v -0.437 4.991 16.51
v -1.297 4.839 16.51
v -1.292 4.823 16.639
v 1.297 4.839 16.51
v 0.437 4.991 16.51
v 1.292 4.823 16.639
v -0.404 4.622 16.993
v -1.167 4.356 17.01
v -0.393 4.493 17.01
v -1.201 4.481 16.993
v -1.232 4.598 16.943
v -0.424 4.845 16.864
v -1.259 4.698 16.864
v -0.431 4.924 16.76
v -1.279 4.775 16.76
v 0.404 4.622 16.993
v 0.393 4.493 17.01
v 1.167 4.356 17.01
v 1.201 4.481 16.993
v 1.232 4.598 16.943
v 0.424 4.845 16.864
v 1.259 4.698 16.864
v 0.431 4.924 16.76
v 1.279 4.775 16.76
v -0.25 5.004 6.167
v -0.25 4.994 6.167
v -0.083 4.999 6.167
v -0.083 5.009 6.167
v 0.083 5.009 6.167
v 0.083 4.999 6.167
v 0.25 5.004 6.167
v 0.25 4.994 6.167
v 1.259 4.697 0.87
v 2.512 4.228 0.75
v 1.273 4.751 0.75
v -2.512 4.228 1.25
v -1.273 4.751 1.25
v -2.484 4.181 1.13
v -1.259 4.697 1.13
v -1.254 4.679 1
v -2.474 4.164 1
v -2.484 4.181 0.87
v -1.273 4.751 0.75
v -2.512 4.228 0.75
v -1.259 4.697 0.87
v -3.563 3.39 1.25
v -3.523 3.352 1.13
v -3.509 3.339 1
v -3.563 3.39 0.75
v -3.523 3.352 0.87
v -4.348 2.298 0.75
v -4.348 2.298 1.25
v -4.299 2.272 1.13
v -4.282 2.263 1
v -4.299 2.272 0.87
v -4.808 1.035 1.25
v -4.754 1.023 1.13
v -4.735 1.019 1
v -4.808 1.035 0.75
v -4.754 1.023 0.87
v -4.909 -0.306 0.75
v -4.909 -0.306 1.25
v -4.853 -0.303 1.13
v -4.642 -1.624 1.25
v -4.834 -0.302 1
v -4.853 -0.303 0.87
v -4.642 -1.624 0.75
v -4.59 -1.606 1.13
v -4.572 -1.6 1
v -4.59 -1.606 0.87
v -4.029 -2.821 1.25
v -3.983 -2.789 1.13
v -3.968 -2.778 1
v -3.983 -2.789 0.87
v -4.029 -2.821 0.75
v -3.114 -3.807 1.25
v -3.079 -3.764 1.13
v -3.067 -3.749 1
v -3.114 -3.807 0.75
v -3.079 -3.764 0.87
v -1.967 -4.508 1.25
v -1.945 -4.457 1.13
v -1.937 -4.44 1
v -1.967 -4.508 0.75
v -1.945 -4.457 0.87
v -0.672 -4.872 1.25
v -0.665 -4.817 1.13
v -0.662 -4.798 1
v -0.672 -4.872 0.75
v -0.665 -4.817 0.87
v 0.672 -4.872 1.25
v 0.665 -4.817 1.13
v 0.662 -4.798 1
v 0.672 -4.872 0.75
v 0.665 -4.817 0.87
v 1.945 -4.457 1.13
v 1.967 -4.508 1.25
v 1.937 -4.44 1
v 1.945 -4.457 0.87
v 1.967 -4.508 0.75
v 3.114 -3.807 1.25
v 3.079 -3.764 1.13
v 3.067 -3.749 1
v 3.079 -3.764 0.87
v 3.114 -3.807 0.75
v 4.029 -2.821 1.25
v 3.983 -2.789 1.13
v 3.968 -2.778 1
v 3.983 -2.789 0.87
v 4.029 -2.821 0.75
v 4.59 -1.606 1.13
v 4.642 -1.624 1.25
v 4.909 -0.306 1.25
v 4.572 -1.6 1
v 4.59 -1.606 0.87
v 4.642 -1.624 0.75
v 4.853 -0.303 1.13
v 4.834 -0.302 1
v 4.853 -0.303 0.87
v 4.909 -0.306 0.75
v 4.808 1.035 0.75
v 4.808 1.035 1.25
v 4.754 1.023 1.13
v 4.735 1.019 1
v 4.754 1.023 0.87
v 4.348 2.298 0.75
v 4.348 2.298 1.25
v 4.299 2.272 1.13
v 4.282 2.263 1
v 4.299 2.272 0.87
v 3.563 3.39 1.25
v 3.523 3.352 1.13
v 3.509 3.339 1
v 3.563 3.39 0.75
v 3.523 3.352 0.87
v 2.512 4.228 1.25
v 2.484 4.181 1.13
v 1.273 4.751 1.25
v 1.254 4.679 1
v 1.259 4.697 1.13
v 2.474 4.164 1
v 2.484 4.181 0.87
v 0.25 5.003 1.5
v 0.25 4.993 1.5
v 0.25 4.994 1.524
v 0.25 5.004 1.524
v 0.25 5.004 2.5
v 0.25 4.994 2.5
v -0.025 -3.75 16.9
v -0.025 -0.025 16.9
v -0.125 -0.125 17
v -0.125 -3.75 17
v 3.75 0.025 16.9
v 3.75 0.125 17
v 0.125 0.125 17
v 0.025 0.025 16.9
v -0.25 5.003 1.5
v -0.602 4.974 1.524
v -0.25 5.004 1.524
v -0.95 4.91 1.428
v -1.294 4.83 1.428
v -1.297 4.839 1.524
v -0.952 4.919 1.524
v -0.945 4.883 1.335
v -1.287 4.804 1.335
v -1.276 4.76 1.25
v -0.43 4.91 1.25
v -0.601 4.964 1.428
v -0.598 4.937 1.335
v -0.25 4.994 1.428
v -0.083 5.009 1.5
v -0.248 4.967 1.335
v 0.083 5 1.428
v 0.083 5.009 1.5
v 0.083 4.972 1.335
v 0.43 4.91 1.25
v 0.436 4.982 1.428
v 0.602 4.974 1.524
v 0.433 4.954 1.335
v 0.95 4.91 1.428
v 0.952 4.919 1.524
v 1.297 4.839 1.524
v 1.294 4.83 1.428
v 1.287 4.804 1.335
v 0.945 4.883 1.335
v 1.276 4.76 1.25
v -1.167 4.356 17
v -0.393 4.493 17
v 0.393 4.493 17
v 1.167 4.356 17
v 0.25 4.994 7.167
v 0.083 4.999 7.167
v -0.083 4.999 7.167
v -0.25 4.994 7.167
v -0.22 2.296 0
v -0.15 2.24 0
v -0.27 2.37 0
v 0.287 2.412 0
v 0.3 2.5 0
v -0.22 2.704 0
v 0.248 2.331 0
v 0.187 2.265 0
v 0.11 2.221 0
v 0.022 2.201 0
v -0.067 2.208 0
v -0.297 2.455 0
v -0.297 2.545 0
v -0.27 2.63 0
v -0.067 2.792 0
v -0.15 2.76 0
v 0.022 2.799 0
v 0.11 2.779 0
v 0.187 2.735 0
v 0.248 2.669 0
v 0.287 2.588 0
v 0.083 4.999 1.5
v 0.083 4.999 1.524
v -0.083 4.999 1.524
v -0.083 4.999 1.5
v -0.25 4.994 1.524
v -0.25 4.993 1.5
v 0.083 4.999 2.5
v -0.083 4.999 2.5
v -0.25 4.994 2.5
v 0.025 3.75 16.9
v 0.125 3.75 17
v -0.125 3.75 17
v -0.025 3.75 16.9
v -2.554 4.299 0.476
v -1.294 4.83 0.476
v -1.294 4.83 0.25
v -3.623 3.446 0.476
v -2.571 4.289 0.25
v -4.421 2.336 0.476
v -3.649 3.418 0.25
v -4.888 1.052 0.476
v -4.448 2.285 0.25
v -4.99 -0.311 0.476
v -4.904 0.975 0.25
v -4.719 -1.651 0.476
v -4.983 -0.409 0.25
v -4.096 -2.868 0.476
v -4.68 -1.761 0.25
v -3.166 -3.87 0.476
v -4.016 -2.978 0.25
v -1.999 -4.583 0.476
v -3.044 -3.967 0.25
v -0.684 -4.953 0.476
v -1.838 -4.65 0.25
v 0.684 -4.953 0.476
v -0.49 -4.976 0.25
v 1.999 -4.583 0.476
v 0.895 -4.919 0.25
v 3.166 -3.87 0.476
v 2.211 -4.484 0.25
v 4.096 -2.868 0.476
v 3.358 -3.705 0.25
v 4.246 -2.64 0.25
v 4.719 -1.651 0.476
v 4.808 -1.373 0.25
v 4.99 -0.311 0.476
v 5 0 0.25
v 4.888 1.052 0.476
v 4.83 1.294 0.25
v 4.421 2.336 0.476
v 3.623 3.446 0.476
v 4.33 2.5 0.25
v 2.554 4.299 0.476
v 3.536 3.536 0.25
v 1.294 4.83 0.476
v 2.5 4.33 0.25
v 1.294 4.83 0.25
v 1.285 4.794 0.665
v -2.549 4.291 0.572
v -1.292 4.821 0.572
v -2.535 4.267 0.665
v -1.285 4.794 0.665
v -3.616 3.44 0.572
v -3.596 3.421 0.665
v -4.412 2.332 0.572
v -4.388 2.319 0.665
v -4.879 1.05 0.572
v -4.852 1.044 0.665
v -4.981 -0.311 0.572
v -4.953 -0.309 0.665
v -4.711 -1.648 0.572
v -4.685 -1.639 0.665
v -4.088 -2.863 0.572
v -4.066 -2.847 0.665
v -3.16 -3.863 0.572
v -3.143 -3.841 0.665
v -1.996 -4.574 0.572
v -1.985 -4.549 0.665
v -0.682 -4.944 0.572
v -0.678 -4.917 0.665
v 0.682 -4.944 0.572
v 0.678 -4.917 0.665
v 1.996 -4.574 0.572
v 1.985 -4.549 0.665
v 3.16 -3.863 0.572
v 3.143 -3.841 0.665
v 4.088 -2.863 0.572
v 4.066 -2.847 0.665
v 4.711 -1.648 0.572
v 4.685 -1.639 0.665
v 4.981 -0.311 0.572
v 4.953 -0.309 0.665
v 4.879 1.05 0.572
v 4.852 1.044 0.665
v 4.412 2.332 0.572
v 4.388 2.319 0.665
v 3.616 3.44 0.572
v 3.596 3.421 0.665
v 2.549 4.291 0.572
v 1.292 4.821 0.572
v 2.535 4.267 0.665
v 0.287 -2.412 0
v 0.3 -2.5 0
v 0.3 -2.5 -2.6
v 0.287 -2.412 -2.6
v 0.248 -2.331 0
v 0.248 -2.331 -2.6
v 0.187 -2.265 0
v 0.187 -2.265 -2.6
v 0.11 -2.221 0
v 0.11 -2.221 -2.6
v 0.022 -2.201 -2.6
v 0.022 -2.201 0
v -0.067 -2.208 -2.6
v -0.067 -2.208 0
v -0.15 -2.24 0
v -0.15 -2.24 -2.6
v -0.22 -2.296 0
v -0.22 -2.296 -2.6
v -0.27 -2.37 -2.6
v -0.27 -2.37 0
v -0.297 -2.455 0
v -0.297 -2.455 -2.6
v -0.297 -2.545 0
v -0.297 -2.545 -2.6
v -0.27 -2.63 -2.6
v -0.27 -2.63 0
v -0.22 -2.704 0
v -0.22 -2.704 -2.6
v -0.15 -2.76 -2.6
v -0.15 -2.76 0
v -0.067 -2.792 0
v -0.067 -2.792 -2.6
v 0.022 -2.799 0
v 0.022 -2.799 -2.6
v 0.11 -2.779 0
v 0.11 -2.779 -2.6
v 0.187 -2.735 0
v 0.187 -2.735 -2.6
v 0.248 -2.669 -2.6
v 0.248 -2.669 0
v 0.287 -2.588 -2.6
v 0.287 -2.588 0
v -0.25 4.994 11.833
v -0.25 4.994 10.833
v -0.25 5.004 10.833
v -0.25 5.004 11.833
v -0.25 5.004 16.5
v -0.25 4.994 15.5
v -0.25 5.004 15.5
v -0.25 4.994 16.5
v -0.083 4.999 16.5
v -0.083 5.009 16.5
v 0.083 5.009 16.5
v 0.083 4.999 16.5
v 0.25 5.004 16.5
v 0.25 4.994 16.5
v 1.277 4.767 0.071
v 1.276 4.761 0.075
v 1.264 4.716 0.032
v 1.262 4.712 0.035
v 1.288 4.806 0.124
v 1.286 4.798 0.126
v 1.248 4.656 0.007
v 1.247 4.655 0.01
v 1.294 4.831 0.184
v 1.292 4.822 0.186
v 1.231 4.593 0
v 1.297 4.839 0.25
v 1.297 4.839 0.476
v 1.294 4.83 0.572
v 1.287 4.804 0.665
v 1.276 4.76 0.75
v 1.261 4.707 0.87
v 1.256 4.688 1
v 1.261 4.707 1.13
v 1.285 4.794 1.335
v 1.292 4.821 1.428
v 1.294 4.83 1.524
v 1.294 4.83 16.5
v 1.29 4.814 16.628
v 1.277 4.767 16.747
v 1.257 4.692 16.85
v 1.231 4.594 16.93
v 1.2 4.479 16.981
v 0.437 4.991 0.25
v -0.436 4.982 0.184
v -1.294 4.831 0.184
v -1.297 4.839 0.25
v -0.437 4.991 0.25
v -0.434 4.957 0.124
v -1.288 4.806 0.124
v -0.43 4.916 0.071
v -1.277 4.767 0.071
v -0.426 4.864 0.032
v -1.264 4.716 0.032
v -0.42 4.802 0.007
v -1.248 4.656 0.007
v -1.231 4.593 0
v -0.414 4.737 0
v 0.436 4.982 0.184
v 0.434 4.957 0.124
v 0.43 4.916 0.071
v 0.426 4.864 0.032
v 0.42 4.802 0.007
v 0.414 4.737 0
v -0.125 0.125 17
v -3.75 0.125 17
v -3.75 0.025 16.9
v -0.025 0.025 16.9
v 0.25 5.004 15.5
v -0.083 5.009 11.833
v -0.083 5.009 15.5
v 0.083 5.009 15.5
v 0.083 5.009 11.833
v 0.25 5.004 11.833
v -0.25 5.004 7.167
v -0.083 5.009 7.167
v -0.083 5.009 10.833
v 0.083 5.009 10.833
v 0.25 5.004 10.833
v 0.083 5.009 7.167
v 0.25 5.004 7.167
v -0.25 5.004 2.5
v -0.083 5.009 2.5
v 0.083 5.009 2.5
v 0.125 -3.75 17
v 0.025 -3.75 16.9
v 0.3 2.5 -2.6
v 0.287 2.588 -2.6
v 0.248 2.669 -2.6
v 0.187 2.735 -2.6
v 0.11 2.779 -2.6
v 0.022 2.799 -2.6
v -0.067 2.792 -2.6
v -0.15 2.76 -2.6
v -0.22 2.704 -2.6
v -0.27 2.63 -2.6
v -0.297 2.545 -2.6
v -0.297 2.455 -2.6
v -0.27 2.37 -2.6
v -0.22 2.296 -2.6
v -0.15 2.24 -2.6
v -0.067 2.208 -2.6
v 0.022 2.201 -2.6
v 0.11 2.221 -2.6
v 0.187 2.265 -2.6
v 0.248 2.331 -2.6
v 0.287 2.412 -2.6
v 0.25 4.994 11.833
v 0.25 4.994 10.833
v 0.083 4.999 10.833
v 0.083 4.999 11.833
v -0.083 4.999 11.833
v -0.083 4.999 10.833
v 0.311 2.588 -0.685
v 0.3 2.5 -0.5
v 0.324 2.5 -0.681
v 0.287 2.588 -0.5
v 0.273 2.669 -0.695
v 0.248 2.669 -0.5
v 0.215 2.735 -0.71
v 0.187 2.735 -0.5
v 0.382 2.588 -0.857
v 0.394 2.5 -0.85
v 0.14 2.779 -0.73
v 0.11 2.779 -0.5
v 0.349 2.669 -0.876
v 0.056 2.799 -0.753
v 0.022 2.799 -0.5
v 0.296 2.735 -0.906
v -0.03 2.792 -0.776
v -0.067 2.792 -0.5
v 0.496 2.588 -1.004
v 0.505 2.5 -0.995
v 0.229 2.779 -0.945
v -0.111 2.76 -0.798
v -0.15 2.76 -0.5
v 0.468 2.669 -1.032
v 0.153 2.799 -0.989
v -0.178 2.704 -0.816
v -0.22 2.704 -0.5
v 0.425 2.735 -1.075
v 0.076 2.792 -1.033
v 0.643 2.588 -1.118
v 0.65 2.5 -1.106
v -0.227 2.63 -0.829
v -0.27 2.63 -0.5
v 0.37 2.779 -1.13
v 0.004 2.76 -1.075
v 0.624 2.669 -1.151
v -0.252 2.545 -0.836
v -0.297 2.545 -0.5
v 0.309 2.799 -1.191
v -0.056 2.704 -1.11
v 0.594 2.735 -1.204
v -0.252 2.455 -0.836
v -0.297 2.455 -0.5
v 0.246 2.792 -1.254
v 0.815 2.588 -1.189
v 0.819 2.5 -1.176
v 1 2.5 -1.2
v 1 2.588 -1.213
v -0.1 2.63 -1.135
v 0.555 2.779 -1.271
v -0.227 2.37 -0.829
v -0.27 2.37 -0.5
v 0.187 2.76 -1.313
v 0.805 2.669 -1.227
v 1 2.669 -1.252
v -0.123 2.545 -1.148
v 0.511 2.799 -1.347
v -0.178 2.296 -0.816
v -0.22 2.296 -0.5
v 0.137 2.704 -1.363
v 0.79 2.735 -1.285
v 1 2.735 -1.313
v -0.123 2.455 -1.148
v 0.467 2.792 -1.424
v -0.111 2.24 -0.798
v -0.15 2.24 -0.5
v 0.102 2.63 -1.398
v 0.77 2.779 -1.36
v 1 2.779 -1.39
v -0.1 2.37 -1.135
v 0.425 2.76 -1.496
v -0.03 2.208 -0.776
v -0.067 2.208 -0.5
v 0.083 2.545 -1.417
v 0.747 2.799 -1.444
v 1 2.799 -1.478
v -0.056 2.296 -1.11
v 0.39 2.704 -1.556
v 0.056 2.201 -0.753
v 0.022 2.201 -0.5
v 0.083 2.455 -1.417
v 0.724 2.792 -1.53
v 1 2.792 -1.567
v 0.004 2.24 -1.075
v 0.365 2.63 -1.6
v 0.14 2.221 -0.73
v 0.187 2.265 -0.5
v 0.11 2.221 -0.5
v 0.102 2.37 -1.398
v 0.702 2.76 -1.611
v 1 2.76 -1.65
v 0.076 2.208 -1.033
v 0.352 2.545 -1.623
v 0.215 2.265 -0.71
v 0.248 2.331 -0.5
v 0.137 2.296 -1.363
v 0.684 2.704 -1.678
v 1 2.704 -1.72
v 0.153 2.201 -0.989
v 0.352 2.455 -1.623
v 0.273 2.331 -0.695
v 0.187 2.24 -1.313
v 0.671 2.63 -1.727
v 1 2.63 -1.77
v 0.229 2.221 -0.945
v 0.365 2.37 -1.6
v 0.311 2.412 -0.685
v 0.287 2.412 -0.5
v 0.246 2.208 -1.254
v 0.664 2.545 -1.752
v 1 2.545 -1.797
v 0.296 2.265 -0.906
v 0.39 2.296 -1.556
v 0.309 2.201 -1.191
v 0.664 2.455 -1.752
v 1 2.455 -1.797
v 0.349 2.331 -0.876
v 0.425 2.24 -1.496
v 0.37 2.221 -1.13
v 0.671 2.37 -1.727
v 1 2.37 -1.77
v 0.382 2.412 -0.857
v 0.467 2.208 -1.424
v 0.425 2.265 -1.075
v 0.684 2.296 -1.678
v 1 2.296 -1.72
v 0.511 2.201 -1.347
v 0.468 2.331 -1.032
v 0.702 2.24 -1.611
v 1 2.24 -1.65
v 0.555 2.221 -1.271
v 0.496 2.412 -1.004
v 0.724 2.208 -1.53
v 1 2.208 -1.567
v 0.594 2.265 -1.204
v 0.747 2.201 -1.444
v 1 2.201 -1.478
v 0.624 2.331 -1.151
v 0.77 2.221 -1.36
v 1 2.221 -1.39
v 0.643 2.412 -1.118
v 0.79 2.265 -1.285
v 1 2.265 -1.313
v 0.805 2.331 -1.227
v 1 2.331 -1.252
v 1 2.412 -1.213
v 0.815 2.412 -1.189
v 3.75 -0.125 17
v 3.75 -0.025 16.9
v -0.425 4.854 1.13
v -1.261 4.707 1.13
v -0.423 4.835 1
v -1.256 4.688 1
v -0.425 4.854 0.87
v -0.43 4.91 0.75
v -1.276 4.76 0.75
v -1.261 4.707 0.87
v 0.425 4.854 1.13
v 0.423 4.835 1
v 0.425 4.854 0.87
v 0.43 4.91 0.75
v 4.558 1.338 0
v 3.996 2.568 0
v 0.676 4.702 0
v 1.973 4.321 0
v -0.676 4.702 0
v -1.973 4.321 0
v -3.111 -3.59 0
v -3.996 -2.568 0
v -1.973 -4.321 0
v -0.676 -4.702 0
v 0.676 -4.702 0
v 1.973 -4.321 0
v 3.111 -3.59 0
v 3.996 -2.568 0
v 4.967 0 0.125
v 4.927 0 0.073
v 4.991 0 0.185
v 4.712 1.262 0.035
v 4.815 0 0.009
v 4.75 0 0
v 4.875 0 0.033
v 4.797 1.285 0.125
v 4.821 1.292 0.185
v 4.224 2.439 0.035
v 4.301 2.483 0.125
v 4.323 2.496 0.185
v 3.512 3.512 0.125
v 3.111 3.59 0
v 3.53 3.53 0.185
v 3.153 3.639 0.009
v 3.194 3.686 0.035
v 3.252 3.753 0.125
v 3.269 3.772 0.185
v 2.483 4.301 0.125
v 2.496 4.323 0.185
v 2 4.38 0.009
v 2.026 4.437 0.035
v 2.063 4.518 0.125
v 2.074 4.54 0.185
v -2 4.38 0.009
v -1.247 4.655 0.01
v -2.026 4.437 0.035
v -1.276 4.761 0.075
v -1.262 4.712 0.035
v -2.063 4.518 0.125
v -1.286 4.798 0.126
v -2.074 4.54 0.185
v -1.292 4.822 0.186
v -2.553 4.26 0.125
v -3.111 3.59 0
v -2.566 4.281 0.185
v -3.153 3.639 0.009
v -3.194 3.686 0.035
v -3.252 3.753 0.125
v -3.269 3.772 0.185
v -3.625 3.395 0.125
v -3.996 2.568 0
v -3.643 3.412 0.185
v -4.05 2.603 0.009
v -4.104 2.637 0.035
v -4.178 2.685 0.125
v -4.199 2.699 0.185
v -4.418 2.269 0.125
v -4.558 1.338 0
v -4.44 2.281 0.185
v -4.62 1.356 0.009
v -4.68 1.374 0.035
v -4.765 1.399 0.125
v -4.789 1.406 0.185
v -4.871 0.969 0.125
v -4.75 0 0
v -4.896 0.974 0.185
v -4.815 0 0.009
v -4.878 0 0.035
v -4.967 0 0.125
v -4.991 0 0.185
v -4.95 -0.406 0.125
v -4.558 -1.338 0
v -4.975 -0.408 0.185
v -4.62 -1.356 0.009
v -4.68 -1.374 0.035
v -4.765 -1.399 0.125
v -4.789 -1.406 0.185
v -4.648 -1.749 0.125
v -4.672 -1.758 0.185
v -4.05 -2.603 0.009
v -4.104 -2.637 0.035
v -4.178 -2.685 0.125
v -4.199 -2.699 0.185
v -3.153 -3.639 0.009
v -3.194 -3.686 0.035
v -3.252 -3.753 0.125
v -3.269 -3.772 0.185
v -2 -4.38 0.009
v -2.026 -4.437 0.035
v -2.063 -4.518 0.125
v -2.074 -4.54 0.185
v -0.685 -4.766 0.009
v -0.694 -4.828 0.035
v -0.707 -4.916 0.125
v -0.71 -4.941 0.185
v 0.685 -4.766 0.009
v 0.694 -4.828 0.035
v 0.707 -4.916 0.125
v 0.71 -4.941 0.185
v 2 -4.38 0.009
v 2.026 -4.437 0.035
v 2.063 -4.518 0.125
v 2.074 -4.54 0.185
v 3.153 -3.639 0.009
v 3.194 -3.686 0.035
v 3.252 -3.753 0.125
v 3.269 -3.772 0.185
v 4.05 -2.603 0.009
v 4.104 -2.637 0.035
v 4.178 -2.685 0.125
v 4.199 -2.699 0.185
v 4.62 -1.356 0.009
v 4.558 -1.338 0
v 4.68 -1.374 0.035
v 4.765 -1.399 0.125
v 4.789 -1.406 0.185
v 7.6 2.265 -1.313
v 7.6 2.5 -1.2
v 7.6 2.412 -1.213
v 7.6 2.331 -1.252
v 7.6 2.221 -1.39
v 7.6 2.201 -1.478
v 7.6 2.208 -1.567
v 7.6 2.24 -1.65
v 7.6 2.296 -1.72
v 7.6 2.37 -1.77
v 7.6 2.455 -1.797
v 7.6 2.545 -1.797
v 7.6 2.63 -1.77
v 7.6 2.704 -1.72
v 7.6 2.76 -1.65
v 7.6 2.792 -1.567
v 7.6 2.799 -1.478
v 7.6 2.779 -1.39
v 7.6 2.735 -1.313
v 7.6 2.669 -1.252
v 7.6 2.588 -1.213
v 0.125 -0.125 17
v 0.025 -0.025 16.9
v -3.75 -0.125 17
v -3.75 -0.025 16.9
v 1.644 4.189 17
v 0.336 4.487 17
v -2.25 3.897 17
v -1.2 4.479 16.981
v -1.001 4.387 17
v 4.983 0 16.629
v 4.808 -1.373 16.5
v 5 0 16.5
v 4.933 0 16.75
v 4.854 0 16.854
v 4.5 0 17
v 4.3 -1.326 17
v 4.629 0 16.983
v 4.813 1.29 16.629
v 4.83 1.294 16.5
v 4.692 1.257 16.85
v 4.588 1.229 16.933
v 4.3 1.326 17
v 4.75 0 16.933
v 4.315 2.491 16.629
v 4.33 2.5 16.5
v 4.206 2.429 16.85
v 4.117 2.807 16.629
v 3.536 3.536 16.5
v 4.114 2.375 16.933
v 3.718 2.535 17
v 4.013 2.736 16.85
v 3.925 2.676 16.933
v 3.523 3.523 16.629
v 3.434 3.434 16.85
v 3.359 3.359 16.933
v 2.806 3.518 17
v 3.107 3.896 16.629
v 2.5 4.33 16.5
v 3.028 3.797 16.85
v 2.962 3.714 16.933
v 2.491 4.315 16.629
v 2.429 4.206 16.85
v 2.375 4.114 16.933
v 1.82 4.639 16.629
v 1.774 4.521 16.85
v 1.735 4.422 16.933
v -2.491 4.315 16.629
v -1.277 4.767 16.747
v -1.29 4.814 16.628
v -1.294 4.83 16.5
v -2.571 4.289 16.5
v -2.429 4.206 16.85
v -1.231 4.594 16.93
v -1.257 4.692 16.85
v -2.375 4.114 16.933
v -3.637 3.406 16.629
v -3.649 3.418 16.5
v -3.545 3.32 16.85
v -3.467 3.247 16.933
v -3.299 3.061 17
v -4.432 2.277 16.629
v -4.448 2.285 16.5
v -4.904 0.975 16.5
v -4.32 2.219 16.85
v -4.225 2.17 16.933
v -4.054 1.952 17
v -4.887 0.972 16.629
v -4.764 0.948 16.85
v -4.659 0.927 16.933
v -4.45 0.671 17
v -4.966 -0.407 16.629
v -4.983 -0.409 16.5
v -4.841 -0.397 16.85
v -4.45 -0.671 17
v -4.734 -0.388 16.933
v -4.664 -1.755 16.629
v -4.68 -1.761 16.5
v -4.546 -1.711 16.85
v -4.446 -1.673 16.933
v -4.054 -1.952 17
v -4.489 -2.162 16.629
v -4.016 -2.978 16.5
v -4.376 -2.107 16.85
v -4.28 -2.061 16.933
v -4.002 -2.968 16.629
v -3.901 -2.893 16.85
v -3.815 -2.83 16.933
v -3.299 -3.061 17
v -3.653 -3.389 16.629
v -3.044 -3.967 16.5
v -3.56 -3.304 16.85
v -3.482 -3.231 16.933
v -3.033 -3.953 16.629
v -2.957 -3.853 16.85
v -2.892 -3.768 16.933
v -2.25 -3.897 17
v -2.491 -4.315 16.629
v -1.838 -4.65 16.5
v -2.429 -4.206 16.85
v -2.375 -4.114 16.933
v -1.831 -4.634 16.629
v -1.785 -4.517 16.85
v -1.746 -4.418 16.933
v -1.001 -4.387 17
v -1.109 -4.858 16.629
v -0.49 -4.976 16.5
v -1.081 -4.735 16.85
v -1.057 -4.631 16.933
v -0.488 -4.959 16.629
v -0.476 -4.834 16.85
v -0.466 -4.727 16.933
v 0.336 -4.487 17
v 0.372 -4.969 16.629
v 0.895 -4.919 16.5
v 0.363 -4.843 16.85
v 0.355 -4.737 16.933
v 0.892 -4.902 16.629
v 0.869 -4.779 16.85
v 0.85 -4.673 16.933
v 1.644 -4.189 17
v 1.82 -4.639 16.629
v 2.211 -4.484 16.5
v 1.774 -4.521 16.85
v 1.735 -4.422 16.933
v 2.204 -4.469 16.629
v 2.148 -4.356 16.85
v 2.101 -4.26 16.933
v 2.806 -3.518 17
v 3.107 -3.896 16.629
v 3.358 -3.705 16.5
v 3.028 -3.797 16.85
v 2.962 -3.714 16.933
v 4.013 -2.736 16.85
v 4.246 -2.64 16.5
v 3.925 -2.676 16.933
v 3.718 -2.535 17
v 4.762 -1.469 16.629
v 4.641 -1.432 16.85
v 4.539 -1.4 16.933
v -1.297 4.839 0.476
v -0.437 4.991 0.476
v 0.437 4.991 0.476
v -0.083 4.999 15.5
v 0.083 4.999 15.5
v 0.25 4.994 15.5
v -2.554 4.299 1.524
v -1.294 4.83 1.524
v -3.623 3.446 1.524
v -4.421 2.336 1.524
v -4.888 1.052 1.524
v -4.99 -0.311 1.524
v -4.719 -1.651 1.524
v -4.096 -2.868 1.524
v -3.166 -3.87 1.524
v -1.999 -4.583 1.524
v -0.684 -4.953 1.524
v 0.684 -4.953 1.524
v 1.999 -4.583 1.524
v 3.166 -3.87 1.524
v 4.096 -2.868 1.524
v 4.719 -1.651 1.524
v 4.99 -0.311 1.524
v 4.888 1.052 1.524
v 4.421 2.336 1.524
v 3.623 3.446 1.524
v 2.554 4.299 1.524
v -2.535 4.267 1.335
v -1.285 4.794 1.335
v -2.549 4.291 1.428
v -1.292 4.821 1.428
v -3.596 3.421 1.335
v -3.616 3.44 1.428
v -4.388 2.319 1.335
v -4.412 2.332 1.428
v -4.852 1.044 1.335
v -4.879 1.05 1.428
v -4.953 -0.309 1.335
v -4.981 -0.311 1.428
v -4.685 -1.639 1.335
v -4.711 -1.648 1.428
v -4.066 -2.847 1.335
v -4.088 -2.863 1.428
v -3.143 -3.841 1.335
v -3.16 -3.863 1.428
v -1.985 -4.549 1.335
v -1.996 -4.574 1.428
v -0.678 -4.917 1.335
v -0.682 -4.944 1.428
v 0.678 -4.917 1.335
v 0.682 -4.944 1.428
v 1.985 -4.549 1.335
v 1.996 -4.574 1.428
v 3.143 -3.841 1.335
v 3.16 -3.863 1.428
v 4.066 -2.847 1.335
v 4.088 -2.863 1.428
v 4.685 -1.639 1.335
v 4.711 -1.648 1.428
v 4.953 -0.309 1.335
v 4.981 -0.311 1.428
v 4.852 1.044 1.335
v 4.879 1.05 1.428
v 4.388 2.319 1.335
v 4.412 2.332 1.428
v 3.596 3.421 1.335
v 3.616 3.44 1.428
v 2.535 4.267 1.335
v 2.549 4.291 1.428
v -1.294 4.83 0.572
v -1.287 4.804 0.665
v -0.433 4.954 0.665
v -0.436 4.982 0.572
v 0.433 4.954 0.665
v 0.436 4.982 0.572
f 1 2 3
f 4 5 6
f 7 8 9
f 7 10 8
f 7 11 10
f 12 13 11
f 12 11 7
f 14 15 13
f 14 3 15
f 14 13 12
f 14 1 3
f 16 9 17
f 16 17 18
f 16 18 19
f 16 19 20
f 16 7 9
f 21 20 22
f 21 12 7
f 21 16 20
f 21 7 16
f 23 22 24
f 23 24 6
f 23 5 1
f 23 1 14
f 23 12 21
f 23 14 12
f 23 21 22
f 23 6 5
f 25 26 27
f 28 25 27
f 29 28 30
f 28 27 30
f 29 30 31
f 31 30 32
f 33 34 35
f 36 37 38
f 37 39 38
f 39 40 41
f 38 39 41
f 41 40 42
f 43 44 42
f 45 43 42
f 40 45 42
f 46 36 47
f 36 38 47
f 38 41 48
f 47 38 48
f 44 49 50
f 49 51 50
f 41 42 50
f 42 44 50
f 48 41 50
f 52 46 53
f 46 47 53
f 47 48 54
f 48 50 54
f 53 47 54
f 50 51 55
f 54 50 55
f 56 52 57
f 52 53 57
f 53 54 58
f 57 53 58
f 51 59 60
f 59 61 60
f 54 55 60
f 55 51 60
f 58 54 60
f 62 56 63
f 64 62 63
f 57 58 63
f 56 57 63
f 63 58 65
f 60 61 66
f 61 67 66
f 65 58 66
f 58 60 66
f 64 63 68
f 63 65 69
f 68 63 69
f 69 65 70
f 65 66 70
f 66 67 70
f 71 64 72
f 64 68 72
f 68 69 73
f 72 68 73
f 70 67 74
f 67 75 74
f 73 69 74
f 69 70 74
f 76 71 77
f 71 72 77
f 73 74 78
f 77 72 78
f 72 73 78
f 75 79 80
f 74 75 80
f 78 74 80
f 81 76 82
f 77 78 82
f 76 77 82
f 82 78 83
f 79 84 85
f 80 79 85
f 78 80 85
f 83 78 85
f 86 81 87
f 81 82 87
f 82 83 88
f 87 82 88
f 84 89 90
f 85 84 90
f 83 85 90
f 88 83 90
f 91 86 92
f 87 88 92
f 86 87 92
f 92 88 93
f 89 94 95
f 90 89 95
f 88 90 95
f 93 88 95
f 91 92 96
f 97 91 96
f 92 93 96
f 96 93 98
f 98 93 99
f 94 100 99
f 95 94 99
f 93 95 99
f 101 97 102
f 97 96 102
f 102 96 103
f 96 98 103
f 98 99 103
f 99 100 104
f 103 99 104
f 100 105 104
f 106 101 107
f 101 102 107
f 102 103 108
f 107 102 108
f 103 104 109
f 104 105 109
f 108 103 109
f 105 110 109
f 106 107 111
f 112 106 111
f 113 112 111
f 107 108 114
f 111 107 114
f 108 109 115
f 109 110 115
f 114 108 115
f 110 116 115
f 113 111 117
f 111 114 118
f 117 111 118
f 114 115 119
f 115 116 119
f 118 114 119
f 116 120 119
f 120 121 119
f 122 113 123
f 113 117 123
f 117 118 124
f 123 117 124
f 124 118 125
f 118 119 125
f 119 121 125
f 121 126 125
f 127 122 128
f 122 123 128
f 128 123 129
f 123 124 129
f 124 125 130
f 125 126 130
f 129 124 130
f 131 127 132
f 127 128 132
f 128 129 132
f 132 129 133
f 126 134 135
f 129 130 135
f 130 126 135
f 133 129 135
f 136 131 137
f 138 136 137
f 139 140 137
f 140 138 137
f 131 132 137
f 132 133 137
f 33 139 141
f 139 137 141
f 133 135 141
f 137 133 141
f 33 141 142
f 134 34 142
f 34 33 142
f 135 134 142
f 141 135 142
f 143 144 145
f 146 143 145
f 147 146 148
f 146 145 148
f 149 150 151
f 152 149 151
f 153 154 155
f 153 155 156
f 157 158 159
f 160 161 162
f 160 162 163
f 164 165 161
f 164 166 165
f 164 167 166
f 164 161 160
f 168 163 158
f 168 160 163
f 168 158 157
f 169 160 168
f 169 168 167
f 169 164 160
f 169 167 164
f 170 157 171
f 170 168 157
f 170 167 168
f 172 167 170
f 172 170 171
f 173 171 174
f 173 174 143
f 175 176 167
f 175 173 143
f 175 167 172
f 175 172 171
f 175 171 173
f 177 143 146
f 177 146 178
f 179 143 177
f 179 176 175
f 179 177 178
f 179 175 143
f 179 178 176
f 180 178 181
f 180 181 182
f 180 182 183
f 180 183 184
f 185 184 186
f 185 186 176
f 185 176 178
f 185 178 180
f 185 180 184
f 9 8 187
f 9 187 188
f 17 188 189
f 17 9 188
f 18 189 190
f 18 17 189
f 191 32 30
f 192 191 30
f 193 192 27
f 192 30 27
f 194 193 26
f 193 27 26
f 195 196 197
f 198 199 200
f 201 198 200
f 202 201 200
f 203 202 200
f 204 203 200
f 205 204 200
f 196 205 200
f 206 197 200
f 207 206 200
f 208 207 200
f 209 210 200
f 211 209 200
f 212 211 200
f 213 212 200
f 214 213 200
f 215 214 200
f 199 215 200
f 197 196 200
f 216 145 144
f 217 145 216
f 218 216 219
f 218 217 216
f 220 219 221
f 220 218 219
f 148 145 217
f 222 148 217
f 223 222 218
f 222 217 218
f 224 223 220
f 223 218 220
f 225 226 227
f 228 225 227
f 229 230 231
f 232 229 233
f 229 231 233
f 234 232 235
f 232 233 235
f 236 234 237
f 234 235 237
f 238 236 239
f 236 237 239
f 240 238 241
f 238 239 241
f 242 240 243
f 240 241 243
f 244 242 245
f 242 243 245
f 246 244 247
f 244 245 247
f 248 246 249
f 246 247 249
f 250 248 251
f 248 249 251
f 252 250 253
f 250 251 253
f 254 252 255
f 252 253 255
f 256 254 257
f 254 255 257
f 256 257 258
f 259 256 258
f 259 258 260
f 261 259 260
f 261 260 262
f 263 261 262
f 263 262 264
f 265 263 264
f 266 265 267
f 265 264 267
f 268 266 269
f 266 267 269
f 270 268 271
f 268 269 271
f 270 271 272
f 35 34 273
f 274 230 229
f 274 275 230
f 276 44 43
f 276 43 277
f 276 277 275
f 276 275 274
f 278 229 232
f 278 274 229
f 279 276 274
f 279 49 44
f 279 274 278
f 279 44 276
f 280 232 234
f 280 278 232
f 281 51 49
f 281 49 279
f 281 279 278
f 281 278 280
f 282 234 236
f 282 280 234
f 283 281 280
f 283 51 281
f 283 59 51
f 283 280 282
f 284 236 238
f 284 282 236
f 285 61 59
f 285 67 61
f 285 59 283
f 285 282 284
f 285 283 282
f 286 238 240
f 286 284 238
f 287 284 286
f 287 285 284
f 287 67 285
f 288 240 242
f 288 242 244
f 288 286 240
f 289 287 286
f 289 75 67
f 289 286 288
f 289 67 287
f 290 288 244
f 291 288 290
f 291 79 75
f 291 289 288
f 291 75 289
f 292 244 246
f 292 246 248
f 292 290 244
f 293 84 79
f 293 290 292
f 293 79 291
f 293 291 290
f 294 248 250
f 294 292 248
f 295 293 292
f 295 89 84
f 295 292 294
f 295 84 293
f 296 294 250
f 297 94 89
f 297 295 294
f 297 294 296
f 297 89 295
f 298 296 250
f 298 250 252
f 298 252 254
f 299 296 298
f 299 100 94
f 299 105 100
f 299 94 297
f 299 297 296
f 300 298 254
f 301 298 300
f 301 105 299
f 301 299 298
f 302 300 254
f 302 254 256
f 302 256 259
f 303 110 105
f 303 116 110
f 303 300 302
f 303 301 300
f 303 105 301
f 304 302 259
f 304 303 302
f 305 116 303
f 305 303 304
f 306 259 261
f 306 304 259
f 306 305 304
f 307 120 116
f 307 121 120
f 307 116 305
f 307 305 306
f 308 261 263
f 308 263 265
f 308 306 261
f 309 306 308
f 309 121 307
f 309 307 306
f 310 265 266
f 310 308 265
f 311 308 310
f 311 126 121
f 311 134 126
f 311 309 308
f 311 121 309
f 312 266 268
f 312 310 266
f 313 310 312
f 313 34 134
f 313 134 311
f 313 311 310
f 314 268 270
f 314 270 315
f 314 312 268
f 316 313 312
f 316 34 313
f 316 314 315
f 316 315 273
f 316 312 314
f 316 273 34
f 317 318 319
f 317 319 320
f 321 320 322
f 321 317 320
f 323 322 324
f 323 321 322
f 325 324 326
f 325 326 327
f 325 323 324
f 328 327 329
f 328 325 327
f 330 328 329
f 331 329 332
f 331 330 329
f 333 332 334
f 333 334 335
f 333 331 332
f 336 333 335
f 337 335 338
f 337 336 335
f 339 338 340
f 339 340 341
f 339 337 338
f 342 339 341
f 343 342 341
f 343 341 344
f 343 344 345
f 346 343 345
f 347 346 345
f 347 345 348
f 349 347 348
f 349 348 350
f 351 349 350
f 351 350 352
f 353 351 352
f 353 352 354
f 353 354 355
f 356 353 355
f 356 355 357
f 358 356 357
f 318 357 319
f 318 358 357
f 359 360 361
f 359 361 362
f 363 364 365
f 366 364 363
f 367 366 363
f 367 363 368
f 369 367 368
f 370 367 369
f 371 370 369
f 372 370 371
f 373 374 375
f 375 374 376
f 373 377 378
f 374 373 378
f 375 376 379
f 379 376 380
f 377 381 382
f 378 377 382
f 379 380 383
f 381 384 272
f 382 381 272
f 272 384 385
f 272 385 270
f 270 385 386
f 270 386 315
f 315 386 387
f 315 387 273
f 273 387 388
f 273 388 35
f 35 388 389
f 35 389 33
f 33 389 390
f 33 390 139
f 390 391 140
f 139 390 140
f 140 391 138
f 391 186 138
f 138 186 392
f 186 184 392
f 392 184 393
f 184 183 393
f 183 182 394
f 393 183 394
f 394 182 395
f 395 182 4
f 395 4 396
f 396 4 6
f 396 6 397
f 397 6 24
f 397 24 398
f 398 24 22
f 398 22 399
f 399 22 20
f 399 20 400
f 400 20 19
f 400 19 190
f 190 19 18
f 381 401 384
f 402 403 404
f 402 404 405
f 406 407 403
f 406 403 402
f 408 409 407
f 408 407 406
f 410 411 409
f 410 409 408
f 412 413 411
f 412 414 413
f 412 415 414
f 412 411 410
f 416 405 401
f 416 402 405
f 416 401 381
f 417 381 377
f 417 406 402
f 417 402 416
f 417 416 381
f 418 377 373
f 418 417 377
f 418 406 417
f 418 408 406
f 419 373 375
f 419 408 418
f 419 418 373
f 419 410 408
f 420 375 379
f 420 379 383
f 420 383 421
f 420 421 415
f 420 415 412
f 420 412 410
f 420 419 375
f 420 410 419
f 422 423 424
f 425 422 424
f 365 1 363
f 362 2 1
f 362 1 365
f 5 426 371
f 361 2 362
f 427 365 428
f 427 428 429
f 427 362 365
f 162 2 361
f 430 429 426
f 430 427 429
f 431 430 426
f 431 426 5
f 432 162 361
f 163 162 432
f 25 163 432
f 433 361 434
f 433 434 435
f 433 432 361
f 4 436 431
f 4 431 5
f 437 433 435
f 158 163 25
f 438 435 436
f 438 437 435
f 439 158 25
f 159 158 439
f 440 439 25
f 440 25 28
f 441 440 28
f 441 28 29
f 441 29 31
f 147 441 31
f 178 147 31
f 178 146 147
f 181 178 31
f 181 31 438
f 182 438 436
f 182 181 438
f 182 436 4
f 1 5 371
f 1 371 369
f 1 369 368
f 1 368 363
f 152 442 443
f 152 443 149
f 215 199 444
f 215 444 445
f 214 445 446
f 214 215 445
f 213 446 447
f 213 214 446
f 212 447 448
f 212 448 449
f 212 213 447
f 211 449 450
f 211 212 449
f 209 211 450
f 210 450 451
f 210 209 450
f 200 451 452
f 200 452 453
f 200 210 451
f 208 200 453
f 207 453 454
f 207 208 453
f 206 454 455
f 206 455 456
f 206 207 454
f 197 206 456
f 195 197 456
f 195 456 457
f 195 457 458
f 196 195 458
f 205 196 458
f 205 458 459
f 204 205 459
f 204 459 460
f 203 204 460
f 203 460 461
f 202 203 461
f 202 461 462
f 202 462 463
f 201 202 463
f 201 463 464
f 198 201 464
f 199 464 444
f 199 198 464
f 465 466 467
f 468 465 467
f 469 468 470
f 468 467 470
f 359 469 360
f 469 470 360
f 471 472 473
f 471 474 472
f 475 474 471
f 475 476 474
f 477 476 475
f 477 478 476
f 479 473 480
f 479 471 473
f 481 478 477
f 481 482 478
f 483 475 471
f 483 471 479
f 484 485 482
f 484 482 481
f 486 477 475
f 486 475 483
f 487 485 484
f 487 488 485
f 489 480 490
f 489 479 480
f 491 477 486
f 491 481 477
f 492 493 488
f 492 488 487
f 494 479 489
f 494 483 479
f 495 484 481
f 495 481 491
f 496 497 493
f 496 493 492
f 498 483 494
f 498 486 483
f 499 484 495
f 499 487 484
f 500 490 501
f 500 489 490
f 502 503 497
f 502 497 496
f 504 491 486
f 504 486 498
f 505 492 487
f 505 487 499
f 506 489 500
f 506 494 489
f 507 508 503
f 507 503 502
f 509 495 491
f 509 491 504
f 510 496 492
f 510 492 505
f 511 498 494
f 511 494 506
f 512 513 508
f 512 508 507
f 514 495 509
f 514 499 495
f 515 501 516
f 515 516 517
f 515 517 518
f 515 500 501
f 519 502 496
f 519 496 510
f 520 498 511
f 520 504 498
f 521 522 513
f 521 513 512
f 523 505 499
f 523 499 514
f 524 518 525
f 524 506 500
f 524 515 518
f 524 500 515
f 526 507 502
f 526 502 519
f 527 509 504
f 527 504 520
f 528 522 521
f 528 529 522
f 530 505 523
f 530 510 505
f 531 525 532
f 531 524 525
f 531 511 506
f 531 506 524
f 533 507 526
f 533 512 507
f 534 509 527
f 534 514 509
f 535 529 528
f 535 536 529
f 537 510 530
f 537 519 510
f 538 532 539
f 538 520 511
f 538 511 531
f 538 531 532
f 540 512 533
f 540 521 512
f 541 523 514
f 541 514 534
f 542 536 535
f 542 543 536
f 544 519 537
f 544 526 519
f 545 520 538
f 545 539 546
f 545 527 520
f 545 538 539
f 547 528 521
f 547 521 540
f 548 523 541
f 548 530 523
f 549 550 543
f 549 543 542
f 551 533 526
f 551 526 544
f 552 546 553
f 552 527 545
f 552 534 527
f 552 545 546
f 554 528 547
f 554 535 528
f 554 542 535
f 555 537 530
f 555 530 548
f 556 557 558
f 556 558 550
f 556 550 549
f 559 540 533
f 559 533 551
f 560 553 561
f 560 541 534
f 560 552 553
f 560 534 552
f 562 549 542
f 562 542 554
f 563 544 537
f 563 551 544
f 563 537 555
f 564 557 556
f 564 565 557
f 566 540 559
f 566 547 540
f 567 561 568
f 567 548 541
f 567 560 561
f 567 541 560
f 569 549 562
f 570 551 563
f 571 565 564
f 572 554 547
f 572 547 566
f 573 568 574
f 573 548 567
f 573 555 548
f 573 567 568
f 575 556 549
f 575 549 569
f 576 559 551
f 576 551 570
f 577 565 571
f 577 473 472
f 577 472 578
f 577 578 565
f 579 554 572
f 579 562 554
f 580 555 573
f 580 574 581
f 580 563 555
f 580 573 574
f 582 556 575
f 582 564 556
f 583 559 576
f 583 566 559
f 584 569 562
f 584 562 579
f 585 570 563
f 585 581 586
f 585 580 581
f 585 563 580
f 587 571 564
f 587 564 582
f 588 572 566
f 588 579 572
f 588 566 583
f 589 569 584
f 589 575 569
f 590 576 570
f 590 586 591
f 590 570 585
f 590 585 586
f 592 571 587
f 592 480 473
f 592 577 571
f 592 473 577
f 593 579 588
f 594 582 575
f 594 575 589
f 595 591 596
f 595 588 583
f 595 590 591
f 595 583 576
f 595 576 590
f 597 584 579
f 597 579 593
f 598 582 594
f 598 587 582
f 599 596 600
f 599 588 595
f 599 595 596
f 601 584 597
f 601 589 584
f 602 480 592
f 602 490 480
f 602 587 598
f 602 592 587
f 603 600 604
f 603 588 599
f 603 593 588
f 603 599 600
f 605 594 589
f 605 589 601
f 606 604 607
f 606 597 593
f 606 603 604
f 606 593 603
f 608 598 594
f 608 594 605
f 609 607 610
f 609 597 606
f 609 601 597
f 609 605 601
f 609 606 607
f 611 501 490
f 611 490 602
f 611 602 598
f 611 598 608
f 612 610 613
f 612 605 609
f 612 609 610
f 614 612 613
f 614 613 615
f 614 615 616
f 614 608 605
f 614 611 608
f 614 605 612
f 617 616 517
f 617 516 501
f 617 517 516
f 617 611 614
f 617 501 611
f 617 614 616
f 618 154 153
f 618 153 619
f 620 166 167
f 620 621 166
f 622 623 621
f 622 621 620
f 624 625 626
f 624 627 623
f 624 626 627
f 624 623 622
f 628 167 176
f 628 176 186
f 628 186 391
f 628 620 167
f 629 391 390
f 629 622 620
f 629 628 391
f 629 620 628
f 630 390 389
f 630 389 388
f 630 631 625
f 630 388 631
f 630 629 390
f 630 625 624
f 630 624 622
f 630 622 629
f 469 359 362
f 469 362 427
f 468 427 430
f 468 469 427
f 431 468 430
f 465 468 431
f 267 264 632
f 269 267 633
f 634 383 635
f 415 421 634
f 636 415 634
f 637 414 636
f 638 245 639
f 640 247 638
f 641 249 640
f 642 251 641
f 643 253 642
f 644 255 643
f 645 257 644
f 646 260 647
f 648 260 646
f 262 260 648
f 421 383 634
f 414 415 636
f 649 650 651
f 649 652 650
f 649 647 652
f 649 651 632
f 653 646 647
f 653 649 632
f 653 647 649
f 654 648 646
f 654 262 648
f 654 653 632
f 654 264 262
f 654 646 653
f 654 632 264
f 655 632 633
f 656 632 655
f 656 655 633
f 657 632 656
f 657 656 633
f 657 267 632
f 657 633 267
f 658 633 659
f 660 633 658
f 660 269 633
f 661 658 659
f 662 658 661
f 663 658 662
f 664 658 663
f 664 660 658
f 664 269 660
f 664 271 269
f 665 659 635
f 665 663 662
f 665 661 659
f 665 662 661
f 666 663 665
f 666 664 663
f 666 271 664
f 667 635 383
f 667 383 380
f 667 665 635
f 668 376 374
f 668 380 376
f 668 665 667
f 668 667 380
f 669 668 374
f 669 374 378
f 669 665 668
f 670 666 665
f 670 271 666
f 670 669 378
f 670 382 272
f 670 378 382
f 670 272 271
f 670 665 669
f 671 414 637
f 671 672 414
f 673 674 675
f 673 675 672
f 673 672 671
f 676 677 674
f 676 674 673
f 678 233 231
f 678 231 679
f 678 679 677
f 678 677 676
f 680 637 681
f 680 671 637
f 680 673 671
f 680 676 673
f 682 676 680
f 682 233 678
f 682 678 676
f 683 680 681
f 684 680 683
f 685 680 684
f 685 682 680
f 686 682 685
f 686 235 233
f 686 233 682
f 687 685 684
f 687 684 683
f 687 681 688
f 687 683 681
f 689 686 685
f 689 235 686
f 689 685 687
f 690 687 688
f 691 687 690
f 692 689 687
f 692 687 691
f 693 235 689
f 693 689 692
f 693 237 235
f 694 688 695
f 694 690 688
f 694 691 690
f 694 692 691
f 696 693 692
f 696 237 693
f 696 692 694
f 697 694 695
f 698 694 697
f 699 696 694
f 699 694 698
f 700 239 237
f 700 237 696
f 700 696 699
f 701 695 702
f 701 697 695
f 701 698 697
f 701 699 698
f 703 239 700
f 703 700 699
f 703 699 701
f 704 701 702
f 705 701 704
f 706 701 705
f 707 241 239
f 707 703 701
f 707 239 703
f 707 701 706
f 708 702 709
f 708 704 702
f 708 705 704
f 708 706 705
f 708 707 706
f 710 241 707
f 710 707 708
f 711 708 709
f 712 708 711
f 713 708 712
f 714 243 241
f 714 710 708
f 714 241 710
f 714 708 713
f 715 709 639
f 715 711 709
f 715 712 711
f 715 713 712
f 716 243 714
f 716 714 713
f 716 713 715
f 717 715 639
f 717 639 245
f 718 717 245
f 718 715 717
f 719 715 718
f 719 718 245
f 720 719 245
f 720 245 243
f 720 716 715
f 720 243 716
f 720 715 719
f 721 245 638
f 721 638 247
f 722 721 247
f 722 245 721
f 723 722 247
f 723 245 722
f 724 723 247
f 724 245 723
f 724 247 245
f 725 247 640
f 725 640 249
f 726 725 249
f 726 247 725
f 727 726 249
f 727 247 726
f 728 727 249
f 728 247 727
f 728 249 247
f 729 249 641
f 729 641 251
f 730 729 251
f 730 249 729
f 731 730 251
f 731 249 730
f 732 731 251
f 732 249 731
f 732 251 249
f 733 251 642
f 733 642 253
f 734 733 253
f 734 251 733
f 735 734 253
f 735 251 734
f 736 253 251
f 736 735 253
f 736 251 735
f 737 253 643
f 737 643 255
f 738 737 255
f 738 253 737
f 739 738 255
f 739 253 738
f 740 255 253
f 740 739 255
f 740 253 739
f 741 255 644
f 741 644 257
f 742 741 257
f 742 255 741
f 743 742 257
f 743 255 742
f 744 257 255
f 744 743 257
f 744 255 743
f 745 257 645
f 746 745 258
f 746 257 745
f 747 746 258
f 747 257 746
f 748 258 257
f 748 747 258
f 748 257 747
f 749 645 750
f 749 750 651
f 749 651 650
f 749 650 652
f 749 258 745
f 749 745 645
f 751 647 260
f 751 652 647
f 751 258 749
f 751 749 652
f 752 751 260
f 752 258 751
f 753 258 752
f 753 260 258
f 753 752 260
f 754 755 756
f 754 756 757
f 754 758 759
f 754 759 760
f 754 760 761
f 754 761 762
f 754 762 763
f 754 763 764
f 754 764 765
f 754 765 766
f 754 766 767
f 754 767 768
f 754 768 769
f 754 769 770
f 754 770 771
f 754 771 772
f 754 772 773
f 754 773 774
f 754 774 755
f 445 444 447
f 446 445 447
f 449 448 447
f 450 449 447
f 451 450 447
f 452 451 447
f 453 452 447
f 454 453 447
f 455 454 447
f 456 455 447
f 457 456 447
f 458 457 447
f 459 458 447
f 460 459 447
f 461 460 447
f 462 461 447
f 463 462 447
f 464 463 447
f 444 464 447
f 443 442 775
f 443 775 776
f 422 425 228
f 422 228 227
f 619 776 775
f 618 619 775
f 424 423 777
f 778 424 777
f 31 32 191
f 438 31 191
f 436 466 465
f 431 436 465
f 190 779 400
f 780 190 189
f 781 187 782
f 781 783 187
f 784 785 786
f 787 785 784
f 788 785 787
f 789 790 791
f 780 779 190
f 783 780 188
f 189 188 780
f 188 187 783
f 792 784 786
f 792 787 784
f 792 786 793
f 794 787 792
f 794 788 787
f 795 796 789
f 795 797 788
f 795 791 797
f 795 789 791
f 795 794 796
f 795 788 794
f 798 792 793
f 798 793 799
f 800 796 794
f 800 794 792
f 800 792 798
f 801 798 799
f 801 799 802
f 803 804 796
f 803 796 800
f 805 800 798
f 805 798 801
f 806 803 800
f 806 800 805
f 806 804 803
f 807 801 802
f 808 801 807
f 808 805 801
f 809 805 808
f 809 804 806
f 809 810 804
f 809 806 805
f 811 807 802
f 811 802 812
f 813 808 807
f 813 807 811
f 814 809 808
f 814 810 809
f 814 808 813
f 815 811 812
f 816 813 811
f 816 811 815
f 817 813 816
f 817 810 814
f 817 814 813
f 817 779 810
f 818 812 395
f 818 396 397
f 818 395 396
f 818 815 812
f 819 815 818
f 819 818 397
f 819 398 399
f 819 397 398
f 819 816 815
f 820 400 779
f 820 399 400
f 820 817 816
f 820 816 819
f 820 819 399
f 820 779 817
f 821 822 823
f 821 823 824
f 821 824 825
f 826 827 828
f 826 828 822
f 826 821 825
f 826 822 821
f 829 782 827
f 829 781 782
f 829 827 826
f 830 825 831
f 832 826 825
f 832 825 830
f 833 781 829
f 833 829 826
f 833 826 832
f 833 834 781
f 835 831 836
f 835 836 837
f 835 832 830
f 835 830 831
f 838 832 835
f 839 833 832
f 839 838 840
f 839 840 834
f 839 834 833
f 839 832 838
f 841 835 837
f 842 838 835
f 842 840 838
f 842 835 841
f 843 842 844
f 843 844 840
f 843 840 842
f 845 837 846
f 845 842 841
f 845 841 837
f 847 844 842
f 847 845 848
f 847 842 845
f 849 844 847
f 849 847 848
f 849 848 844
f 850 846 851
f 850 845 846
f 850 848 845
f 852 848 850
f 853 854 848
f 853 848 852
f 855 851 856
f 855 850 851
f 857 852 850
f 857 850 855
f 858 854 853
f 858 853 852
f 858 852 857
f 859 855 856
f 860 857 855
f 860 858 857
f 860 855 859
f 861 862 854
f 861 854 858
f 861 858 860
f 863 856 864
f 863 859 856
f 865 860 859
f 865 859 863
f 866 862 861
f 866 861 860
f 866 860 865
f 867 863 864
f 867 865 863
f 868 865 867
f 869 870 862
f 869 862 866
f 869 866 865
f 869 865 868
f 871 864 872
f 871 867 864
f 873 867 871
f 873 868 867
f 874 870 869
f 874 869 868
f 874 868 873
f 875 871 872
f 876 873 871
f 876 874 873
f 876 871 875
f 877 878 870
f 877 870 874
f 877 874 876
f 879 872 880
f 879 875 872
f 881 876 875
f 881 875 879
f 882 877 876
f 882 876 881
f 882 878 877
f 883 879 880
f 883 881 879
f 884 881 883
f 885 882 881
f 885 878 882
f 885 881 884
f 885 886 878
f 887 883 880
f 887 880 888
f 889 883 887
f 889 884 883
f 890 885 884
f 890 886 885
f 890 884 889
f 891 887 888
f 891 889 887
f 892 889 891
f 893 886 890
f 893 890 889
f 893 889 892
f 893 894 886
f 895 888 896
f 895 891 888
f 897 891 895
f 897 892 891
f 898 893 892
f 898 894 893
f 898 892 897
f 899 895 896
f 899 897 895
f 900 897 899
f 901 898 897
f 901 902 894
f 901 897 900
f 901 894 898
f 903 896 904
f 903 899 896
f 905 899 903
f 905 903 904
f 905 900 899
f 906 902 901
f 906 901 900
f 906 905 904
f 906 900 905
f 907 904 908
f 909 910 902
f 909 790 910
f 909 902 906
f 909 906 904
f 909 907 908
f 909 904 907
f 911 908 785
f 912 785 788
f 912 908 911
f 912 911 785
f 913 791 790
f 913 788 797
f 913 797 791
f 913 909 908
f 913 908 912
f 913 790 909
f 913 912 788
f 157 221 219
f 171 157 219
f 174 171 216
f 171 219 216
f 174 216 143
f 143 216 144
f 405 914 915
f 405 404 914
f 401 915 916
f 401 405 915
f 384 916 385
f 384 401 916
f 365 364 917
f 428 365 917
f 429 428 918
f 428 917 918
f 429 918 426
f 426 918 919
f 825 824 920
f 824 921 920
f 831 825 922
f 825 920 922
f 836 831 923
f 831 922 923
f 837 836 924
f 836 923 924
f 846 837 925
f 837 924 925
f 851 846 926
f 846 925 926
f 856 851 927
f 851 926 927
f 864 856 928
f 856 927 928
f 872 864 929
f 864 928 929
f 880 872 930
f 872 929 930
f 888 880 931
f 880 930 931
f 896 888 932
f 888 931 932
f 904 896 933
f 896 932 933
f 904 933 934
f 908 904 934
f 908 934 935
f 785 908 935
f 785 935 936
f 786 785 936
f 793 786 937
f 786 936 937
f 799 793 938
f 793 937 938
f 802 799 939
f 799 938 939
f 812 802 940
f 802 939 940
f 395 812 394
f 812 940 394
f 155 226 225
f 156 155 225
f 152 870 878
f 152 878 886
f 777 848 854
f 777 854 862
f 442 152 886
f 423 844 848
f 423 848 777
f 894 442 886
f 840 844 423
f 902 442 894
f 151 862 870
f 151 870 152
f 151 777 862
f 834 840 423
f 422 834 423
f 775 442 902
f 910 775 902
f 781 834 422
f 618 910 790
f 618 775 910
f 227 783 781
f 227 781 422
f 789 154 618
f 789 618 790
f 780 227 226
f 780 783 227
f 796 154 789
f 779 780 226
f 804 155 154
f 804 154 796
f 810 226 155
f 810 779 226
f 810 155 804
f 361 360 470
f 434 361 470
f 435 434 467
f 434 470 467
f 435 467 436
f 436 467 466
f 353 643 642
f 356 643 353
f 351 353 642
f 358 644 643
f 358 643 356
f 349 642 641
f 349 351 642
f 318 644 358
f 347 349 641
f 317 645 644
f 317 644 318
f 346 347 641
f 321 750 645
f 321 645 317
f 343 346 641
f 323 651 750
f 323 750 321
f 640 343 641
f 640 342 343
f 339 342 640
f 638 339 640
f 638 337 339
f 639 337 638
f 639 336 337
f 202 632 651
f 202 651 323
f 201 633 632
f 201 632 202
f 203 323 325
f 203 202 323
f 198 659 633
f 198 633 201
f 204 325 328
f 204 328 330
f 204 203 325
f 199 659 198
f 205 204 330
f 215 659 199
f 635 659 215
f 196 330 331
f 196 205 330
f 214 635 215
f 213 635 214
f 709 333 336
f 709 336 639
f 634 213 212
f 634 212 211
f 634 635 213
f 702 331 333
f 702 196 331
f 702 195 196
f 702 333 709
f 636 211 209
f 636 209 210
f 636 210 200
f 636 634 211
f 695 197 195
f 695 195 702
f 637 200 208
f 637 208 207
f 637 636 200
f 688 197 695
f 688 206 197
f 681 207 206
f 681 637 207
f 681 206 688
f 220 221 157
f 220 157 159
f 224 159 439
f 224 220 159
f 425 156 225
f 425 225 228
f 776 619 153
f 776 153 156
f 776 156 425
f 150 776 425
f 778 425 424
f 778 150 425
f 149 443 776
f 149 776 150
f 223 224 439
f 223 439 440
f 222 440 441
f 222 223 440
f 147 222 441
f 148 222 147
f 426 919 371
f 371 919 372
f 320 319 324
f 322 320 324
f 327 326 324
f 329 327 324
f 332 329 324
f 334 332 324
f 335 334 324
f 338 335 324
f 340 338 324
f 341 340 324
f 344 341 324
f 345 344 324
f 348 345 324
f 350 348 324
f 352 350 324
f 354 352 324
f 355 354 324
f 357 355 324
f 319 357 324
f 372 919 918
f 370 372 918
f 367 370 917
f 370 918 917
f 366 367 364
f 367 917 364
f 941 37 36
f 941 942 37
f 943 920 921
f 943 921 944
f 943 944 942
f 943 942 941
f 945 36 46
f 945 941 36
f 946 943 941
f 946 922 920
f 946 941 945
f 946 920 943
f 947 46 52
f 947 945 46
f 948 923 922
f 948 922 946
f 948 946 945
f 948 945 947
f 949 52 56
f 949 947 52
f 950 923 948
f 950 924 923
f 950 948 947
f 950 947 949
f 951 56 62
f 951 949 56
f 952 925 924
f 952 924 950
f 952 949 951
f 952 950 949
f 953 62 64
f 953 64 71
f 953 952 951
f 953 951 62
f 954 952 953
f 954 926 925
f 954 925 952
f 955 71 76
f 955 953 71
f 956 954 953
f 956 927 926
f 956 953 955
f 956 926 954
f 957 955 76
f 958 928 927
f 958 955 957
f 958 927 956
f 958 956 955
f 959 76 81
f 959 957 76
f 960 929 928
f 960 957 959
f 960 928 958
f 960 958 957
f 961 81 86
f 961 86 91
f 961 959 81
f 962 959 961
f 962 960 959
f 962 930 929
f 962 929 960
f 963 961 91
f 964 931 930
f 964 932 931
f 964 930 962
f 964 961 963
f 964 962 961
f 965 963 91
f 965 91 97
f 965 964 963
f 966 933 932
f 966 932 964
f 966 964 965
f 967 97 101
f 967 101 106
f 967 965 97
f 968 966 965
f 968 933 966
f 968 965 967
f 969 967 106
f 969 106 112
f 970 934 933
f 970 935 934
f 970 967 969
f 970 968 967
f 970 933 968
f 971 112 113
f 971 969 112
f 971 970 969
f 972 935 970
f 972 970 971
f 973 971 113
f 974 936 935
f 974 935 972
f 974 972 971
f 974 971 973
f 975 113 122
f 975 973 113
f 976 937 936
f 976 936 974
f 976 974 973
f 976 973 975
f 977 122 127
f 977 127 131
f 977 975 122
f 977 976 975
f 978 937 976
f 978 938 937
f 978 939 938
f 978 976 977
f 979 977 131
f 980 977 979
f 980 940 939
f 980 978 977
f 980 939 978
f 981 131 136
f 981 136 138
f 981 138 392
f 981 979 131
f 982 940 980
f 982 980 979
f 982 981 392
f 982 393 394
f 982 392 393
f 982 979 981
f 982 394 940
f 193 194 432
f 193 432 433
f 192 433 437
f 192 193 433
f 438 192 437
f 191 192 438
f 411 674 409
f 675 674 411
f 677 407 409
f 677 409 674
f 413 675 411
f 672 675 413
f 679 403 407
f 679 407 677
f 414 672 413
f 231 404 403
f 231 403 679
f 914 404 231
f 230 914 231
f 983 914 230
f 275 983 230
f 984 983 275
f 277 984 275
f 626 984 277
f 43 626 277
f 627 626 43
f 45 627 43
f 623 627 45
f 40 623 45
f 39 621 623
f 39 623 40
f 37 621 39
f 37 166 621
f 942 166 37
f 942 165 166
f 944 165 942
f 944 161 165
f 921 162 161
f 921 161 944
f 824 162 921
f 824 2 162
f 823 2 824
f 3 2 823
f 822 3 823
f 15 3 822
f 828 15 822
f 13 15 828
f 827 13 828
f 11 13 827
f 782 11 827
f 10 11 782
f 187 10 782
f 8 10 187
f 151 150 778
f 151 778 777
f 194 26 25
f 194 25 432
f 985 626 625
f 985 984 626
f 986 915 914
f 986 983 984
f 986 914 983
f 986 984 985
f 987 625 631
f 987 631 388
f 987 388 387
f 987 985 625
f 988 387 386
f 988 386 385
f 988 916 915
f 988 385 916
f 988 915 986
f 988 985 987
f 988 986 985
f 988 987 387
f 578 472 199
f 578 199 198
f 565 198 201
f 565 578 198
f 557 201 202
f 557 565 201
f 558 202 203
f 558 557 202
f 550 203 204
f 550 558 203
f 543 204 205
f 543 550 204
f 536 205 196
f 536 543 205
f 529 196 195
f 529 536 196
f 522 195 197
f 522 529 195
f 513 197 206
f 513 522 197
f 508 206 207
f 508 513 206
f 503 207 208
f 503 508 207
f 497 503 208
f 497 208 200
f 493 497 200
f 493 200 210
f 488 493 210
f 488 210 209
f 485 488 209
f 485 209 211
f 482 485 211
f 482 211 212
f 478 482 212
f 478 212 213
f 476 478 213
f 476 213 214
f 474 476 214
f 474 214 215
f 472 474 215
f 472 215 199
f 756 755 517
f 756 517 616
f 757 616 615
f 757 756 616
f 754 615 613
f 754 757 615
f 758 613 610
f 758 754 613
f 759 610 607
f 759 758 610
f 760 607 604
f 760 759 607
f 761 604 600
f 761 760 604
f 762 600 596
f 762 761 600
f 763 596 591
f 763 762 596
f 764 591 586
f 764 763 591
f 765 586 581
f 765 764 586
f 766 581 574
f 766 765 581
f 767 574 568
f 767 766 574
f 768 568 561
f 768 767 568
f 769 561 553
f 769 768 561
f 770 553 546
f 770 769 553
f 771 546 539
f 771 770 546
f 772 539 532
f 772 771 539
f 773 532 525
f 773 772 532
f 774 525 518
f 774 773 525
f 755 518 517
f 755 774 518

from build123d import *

# Parameters (mm, degrees)
SKETCH003_R         = 0.3
REVOLUTION001_ANGLE = -30
SKETCH015_W         = 0.5
SKETCH015_H         = 1
POCKET002_DEPTH     = 5.011
LINEARPATTERN_COUNT = 4
LINEARPATTERN_PITCH = 4.666667
SKETCH010_R         = 0.3
PAD002_DEPTH        = 2.6
SKETCH013_R         = 4.5
PAD_DEPTH           = 0.5
POCKET001_DEPTH     = 3.75
POLARPATTERN_COUNT  = 3
POLARPATTERN_ANGLE  = 180
SKETCH012_R         = 4.5
POCKET_DEPTH        = 0.5


with BuildPart() as leadangledclone:
    # AdditivePipe: sweep along a path in Sketch004
    with BuildLine(Plane.XZ) as additivepipe_path:
        Line((0, 0), (0, -0.5))
        ThreePointArc((0, -0.5), (0.292893, -1.207107), (1, -1.5))
        Line((1, -1.5), (7.6, -1.5))
    # Sketch003 (on ShapeBinder) → AdditivePipe (sweep)
    with BuildSketch(Plane(origin=(0, 0, 0), x_dir=(1, 0, 0), z_dir=(0, 0, -1))):
        with Locations((0, 2.5)):
            Circle(SKETCH003_R)
    sweep(path=additivepipe_path.line)


with BuildPart() as leadangledclone_1:
    # Body003 placement: moved
    add(leadangledclone.part.moved(Location((0, 5, 0))))


with BuildPart() as polaritymarking:
    # Sketch005 → Revolution001 (revolve)
    with BuildSketch(Plane(origin=(0, 0, 0), x_dir=(-0.258819, 0.965926, 0), z_dir=(0.965926, 0.258819, 0))):
        with BuildLine():
            Line((4.51, 0.25), (4.51, 17.01))
            ThreePointArc((4.51, 17.01), (4.863553, 16.863553), (5.01, 16.51))
            Line((5.01, 16.51), (5.01, 1.523941))
            ThreePointArc((5.01, 1.523941), (4.989134, 1.381006), (4.928278, 1.25))
            ThreePointArc((4.928278, 1.25), (4.853698, 1), (4.928278, 0.75))
            ThreePointArc((4.928278, 0.75), (4.989134, 0.618994), (5.01, 0.476059))
            Line((5.01, 0.476059), (5.01, 0.25))
            ThreePointArc((5.01, 0.25), (4.76, 0), (4.51, 0.25))
        make_face()
    revolve(axis=Axis((0, 0, 0), (0, 0, 1)), revolution_arc=REVOLUTION001_ANGLE)

    # Sketch015 → Pocket002 (cut, through all)
    with BuildSketch(Plane.XZ):
        with Locations((0, 2)):
            Rectangle(SKETCH015_W, SKETCH015_H)
    pocket002 = extrude(amount=-POCKET002_DEPTH, mode=Mode.SUBTRACT)

    # LinearPattern: Pocket002 ×4
    with Locations(*[(0, 0, i * LINEARPATTERN_PITCH) for i in range(1, LINEARPATTERN_COUNT)]):
        add(pocket002, mode=Mode.SUBTRACT)


with BuildPart() as leadstraight:
    # Sketch010 → Pad002 (new body)
    with BuildSketch(Plane(origin=(0, 2.5, 0), x_dir=(1, 0, 0), z_dir=(0, 0, 1))):
        Circle(SKETCH010_R)
    extrude(amount=-PAD002_DEPTH)


with BuildPart() as leadstraightclone:
    # Body007 base: copy of LeadStraight
    add(leadstraight.part)


with BuildPart() as leadstraightclone_1:
    # Body007 placement: moved
    add(leadstraightclone.part.moved(Location((0, -5, 0))))


with BuildPart() as housingtop:
    # Sketch013 (on ShapeBinder) → Pad (new body)
    with BuildSketch(Plane.XY.offset(16.5)):
        Circle(SKETCH013_R)
    extrude(amount=PAD_DEPTH)

    # Sketch014 → Pocket001 (cut, symmetric)
    with BuildSketch(Plane.XZ):
        Polygon((-0.125, 17), (0.125, 17), (0.025, 16.9), (-0.025, 16.9), align=None)
    pocket001 = extrude(amount=POCKET001_DEPTH, both=True, mode=Mode.SUBTRACT)

    # PolarPattern: Pocket001 ×3 about axis
    polarpattern_axis = Axis((0, 0, 0), (0, 0, 1))
    for i in range(1, POLARPATTERN_COUNT):
        add(pocket001.rotate(polarpattern_axis, i * POLARPATTERN_ANGLE / (POLARPATTERN_COUNT - 1)), mode=Mode.SUBTRACT)


with BuildPart() as fusion:
    # Sketch → Revolution (revolve)
    with BuildSketch(Plane.XZ):
        with BuildLine():
            Line((0, 17), (4.5, 17))
            ThreePointArc((5, 16.5), (4.853553, 16.853553), (4.5, 17))
            Line((5, 16.5), (5, 1.523941))
            ThreePointArc((4.918278, 1.25), (4.979134, 1.381006), (5, 1.523941))
            ThreePointArc((4.918278, 1.25), (4.843698, 1), (4.918278, 0.75))
            ThreePointArc((5, 0.476059), (4.979134, 0.618994), (4.918278, 0.75))
            Line((5, 0.476059), (5, 0.25))
            ThreePointArc((4.75, 0), (4.926777, 0.073223), (5, 0.25))
            Line((0, 0), (4.75, 0))
            Line((0, 17), (0, 0))
        make_face()
    revolve(axis=Axis((0, 0, 0), (0, 0, 1)))

    # Sketch012 → Pocket (cut)
    with BuildSketch(Plane.XY.offset(17)):
        Circle(SKETCH012_R)
    extrude(amount=-POCKET_DEPTH, mode=Mode.SUBTRACT)

    # Fusion: union PolarityMarking, LeadStraight, LeadStraightClone, HousingTop
    add(polaritymarking.part)
    add(leadstraight.part)
    add(leadstraightclone_1.part)
    add(housingtop.part)


solid = Compound([leadangledclone_1.part, fusion.part])
